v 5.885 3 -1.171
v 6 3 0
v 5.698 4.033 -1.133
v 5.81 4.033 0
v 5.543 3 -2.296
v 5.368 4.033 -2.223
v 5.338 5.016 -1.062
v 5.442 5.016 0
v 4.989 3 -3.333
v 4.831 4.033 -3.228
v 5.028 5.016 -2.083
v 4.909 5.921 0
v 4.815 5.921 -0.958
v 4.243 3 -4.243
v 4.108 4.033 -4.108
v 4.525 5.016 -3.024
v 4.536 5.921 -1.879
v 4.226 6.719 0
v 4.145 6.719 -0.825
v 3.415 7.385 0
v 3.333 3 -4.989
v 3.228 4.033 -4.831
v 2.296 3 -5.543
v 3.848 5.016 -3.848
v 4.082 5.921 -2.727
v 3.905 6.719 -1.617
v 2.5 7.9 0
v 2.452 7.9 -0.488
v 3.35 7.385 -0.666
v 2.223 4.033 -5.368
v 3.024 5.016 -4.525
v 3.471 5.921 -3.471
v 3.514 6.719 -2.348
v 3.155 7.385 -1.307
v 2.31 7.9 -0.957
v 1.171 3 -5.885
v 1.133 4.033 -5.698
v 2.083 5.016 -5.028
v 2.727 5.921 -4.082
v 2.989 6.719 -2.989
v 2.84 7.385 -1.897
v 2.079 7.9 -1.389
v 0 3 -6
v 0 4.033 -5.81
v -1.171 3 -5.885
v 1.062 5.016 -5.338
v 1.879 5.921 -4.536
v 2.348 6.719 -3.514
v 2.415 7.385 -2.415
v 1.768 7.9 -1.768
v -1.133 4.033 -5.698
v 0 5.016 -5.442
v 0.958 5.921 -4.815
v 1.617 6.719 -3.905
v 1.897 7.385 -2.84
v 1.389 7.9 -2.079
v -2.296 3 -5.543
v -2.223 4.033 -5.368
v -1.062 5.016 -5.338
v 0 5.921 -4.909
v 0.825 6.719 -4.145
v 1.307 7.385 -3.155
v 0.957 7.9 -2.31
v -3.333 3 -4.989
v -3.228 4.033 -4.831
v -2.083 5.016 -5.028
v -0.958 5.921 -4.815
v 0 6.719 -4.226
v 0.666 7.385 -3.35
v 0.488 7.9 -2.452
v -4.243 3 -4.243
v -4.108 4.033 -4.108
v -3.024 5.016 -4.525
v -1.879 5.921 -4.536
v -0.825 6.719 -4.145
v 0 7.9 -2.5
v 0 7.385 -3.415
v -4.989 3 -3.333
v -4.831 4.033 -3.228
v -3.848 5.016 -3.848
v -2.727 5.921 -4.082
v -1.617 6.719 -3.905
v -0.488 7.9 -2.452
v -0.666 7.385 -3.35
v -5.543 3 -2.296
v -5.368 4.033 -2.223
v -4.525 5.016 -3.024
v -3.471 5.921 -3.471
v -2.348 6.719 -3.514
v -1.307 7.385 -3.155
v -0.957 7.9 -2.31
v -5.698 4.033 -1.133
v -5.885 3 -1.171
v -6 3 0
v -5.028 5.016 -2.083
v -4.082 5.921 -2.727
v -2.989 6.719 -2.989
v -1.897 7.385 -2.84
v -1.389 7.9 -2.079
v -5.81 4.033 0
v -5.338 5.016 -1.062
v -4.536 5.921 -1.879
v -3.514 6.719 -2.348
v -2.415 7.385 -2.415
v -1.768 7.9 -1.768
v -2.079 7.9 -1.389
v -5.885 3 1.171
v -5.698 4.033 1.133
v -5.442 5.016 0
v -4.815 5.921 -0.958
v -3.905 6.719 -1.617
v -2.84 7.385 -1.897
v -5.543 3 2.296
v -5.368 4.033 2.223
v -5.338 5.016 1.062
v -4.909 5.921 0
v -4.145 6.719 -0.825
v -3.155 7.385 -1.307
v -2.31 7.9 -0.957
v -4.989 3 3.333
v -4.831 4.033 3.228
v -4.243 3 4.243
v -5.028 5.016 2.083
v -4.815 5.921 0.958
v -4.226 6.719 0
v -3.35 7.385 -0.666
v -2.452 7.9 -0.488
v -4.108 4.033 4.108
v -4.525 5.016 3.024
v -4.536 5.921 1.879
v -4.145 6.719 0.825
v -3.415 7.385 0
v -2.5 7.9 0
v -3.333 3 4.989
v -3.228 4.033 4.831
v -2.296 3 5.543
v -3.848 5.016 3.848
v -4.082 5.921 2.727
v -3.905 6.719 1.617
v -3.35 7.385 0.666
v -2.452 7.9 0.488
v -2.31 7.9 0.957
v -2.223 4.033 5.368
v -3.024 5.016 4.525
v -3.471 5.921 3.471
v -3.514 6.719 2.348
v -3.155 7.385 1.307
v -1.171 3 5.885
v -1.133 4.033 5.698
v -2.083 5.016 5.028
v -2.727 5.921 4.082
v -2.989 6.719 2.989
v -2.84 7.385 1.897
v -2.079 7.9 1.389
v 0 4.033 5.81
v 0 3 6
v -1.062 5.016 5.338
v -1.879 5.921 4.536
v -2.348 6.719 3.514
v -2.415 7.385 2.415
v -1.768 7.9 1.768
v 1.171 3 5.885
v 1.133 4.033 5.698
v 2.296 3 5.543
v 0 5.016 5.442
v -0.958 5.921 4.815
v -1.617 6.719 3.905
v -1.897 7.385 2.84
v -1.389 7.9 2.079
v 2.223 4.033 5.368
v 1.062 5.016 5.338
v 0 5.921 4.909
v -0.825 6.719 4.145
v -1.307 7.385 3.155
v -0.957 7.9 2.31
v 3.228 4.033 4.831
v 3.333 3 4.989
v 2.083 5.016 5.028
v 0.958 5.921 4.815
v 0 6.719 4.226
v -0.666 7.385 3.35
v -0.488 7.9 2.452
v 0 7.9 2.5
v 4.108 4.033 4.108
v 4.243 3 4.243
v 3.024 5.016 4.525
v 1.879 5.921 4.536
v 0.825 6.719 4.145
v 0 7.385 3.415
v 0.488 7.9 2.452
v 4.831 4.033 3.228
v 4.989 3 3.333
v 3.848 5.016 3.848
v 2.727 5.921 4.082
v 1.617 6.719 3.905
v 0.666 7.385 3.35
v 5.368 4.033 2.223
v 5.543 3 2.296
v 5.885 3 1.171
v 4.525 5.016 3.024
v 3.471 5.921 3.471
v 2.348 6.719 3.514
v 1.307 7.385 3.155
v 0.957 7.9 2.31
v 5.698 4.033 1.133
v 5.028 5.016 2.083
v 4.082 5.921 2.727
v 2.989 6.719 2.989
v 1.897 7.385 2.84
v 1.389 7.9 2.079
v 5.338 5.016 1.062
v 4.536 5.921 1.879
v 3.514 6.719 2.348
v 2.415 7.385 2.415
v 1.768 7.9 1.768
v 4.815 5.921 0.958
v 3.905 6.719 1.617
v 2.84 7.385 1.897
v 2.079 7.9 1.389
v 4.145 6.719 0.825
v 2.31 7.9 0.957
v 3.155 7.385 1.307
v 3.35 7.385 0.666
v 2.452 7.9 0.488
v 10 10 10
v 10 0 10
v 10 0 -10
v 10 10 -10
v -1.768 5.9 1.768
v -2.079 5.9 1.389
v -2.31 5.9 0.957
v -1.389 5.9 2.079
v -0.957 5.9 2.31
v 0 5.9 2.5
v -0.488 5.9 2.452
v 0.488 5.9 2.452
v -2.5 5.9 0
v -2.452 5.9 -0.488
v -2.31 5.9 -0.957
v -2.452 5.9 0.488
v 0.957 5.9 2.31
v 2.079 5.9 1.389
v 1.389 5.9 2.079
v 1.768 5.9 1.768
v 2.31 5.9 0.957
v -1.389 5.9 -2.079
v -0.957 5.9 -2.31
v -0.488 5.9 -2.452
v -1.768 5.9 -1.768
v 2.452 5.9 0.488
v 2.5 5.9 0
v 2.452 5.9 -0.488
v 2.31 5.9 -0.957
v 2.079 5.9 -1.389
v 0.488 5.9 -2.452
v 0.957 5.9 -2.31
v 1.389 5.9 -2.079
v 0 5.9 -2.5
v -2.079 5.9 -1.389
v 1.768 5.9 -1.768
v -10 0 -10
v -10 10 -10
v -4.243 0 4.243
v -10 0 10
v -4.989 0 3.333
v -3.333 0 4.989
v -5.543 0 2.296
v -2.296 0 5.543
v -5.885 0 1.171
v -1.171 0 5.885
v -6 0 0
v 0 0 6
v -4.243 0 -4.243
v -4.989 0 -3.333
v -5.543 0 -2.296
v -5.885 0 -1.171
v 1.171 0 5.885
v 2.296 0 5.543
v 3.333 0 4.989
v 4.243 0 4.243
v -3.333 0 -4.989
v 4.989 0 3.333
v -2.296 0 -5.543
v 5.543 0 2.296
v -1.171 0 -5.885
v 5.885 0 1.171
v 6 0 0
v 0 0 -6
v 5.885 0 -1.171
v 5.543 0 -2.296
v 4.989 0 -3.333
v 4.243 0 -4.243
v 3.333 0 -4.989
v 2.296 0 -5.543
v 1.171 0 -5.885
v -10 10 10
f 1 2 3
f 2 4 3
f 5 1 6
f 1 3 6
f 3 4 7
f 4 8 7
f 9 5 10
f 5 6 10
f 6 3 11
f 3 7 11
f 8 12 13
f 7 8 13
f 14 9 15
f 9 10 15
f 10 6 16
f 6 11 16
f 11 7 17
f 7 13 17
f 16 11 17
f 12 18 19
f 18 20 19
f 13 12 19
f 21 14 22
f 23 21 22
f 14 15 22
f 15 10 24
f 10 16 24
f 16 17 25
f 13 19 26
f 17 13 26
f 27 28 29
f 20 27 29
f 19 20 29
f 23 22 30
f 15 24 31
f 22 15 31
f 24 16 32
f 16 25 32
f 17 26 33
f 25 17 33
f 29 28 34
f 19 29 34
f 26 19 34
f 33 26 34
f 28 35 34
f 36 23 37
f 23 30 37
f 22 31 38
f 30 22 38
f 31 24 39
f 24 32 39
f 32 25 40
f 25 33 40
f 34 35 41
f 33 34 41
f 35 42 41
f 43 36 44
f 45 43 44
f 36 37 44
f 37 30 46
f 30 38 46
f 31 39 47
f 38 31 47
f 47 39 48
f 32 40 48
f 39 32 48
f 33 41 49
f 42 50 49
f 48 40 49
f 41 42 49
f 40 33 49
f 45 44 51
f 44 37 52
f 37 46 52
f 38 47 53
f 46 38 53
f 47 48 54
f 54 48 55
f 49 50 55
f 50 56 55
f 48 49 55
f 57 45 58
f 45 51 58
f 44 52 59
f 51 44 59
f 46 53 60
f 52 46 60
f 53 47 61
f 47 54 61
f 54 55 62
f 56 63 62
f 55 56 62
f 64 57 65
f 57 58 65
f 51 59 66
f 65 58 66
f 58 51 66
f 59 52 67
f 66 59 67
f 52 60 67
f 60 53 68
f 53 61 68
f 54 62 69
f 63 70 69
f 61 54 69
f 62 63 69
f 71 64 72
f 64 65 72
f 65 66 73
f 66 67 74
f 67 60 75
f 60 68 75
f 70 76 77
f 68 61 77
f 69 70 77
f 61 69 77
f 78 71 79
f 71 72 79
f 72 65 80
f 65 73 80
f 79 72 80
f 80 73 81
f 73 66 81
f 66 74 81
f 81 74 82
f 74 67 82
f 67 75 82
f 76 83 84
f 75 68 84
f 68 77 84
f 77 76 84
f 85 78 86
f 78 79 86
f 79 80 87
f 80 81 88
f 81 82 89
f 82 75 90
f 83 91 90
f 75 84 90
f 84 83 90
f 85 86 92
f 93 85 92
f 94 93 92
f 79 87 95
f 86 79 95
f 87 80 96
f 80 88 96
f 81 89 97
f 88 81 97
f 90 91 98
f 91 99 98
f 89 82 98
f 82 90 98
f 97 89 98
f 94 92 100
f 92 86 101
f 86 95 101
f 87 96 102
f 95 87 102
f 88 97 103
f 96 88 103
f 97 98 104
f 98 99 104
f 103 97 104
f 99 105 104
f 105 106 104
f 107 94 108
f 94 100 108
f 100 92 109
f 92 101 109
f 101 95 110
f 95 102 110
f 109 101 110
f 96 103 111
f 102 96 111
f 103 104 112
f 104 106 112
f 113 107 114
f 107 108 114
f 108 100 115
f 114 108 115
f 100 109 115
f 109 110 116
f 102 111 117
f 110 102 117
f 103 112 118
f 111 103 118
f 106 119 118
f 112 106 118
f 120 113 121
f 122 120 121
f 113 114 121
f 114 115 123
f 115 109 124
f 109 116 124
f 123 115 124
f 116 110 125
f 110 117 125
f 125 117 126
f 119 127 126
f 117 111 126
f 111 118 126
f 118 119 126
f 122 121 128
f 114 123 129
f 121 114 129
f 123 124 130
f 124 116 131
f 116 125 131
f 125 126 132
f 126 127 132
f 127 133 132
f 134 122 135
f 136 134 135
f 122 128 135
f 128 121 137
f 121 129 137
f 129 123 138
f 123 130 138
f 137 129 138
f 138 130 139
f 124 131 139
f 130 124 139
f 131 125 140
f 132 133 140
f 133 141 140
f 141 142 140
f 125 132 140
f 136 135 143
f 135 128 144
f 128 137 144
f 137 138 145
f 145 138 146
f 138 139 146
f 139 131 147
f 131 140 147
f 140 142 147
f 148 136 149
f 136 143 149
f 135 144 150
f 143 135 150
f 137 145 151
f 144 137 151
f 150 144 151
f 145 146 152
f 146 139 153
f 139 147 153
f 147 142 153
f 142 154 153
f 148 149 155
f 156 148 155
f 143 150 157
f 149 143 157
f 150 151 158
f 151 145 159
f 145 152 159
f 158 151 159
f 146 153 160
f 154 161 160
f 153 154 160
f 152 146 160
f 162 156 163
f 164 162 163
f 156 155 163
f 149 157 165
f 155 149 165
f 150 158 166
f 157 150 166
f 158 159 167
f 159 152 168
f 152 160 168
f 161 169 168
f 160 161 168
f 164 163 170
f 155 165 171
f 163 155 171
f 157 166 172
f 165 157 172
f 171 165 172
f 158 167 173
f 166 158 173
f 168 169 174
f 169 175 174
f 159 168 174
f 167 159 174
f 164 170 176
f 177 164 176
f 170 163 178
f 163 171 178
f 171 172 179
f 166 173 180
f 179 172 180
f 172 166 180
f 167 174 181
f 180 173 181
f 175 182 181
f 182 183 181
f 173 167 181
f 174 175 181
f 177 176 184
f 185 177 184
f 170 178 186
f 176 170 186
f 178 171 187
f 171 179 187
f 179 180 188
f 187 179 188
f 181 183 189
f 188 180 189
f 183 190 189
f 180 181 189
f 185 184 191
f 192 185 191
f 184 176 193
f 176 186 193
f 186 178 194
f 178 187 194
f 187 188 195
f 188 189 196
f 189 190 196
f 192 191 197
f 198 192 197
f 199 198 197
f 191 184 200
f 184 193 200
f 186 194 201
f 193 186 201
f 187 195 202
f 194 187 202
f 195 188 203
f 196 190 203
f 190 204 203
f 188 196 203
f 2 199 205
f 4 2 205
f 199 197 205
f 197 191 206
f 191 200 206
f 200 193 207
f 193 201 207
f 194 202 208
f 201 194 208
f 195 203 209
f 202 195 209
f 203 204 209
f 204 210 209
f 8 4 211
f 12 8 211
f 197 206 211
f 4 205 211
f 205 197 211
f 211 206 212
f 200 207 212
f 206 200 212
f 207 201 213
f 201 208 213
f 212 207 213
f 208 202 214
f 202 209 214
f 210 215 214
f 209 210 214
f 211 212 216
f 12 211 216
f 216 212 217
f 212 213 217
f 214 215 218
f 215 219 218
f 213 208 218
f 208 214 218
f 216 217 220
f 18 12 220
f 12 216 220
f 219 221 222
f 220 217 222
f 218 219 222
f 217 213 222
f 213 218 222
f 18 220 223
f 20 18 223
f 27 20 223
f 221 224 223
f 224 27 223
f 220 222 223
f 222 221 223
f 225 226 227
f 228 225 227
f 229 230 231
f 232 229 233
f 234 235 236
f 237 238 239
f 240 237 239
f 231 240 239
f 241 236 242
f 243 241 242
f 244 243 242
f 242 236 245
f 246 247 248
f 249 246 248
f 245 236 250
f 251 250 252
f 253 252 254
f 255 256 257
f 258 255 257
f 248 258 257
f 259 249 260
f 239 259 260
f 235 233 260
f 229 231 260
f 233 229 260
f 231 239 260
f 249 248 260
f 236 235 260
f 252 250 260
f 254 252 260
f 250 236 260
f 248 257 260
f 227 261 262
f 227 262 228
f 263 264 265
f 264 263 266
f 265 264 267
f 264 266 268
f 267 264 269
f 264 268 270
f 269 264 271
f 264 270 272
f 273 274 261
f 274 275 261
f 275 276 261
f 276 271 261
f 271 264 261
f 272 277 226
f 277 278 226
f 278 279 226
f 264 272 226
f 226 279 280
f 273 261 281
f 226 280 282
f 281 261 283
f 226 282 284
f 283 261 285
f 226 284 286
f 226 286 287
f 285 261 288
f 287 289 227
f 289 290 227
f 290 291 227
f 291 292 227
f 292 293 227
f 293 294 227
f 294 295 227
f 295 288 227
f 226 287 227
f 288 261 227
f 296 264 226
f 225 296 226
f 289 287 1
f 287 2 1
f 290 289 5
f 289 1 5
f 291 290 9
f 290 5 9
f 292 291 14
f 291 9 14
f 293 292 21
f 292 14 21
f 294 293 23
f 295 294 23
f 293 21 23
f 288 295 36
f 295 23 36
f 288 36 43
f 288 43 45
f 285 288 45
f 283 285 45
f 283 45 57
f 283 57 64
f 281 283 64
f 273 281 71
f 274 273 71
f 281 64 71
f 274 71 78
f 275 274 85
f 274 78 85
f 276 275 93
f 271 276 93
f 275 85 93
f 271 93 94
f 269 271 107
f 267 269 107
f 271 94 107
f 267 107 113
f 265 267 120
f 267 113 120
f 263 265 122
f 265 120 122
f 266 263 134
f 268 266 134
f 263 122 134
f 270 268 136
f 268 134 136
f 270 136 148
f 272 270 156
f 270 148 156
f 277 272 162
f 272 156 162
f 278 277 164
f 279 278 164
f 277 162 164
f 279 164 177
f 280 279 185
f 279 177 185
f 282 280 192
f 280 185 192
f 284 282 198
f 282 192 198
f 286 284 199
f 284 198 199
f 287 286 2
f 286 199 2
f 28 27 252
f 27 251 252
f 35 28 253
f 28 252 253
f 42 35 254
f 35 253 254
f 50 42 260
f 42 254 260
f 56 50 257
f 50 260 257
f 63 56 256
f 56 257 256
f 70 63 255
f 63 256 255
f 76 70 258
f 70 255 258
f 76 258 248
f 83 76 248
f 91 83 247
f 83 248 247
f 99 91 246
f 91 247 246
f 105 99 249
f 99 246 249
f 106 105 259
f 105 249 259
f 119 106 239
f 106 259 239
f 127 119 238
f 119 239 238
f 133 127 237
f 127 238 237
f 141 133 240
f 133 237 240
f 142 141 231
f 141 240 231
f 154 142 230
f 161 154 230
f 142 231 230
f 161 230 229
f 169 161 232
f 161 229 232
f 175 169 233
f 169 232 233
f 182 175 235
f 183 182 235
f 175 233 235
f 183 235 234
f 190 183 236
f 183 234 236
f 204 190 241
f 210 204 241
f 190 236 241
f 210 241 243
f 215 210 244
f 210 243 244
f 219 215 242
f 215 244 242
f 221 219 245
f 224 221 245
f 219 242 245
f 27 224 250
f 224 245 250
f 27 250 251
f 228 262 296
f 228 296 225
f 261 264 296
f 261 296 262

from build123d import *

# Parameters (mm, degrees)
SKETCH1_W           = 20
SKETCH1_H           = 20
BOSS_EXTRUDE1_DEPTH = 10


# Read off the part's stored shape, not the designer's step: Cavity1
with BuildPart() as part:
    # Sketch1 → Boss-Extrude1 (new body)
    with BuildSketch(Plane(origin=(0, 0, 0), x_dir=(1, 0, 0), z_dir=(0, 1, 0))):
        Rectangle(SKETCH1_W, SKETCH1_H)
    extrude(amount=BOSS_EXTRUDE1_DEPTH)

    # Cavity1 outline → Cavity1 (revolve, cut)
    with BuildSketch(Plane.XY):
        with BuildLine():
            Line((2.5, 5.9), (0, 5.9))
            Line((0, 5.9), (0, 0))
            Line((0, 0), (6, 0))
            Line((6, 0), (6, 3))
            ThreePointArc((6, 3), (4.909210346, 5.920864533), (2.5, 7.9))
            Line((2.5, 7.9), (2.5, 5.9))
        make_face()
    revolve(axis=Axis((0, 0, 0), (0, 1, 0)), mode=Mode.SUBTRACT)


solid = part.part
